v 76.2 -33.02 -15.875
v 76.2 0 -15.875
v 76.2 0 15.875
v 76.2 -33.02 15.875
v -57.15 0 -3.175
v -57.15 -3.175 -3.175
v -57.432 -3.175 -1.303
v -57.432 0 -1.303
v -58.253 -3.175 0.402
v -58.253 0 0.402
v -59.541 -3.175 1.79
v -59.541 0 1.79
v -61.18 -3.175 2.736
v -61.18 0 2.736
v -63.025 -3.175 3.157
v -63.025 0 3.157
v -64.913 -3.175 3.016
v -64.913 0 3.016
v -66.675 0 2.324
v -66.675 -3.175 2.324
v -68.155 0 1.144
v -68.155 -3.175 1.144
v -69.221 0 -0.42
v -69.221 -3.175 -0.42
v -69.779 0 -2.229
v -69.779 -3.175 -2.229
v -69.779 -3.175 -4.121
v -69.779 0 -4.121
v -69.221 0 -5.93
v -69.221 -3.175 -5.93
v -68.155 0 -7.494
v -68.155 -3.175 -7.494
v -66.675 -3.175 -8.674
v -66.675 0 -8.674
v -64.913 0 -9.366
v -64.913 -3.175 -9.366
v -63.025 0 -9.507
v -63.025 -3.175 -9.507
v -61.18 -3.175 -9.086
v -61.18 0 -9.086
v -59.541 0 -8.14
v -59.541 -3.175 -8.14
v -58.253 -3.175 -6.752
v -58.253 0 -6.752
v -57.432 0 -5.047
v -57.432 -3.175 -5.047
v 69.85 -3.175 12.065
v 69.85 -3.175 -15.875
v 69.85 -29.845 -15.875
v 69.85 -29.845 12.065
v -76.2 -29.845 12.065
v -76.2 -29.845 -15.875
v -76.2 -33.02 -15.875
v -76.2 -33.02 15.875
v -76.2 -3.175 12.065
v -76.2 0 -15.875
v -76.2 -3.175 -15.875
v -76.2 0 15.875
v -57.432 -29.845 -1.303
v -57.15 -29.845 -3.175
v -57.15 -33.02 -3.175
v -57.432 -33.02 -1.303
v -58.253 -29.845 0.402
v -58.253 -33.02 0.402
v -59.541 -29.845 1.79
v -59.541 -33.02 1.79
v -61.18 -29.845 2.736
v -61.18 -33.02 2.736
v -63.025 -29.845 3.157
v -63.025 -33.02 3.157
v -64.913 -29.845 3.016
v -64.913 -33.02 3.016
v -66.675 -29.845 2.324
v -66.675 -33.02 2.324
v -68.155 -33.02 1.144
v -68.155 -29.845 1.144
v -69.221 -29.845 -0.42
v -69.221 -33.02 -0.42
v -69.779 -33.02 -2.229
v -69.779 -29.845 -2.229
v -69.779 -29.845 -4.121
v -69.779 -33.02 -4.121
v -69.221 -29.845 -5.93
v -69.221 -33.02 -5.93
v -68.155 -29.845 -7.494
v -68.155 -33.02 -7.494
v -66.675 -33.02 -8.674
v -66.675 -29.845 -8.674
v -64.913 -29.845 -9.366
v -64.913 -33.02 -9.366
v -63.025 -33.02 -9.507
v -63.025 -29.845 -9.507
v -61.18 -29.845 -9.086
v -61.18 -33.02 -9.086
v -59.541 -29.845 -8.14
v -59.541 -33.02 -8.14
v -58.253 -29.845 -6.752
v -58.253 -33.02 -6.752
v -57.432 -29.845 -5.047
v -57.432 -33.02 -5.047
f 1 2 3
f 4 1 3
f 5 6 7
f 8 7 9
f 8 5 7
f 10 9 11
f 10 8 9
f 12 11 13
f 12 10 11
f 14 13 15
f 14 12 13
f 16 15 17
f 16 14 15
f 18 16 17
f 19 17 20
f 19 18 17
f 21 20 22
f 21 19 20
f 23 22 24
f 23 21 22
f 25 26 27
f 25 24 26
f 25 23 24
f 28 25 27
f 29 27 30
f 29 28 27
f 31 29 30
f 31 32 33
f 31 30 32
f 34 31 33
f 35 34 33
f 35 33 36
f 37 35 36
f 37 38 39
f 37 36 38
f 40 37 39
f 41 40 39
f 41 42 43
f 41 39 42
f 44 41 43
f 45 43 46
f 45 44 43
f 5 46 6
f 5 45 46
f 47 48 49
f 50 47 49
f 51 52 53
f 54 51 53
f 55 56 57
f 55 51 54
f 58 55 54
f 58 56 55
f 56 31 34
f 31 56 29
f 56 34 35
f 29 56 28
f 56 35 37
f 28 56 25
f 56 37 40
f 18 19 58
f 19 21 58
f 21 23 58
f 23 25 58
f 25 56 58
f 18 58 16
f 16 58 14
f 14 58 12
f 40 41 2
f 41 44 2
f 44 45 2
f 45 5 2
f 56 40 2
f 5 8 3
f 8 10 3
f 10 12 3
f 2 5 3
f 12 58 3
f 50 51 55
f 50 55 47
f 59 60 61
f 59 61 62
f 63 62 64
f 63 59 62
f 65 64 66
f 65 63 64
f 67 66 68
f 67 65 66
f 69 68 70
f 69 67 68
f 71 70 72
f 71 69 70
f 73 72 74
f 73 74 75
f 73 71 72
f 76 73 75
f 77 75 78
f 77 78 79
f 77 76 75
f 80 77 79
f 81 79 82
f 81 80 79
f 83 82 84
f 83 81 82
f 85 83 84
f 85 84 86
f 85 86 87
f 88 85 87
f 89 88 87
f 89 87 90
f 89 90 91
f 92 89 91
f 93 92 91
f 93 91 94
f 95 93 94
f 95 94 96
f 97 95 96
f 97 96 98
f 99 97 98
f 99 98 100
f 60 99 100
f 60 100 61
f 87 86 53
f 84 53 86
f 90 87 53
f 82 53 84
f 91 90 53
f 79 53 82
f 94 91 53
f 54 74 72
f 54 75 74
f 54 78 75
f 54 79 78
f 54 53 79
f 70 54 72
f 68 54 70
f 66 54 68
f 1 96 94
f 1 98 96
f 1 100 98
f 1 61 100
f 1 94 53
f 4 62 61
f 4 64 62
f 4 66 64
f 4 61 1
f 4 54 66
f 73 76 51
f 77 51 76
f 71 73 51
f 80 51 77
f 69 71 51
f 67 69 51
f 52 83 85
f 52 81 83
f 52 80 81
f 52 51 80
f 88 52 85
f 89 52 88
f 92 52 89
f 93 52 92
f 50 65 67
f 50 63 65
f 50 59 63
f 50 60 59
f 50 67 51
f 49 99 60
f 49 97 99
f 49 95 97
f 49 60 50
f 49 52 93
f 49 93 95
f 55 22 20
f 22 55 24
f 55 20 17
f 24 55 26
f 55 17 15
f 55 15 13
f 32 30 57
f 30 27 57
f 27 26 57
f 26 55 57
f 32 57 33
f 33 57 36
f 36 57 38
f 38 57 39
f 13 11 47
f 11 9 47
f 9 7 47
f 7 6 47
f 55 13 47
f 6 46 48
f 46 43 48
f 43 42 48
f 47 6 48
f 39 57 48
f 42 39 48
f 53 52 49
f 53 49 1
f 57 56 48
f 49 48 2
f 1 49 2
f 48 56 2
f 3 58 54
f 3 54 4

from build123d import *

# Parameters (mm, degrees)
F0_W     = 152.4
F0_H     = 31.75
F0_R     = 6.35
F1_DEPTH = 33.02
F2_W     = 146.05
F2_H     = 26.67
F3_DEPTH = 27.94


with BuildPart() as f1:
    # F0 (on Front) → F1 (new body)
    with BuildSketch(Plane.XZ):
        Rectangle(F0_W, F0_H)
        with Locations((-63.5, -3.175)):
            Circle(F0_R, mode=Mode.SUBTRACT)
    extrude(amount=F1_DEPTH)

    # F2 (on face) → F3 (cut)
    with BuildSketch(Plane(origin=(0, 0, -15.875), x_dir=(1, 0, 0), z_dir=(0, 0, -1))):
        with Locations((-3.175, 16.51)):
            Rectangle(F2_W, F2_H)
    extrude(amount=-F3_DEPTH, mode=Mode.SUBTRACT)


solid = f1.part
